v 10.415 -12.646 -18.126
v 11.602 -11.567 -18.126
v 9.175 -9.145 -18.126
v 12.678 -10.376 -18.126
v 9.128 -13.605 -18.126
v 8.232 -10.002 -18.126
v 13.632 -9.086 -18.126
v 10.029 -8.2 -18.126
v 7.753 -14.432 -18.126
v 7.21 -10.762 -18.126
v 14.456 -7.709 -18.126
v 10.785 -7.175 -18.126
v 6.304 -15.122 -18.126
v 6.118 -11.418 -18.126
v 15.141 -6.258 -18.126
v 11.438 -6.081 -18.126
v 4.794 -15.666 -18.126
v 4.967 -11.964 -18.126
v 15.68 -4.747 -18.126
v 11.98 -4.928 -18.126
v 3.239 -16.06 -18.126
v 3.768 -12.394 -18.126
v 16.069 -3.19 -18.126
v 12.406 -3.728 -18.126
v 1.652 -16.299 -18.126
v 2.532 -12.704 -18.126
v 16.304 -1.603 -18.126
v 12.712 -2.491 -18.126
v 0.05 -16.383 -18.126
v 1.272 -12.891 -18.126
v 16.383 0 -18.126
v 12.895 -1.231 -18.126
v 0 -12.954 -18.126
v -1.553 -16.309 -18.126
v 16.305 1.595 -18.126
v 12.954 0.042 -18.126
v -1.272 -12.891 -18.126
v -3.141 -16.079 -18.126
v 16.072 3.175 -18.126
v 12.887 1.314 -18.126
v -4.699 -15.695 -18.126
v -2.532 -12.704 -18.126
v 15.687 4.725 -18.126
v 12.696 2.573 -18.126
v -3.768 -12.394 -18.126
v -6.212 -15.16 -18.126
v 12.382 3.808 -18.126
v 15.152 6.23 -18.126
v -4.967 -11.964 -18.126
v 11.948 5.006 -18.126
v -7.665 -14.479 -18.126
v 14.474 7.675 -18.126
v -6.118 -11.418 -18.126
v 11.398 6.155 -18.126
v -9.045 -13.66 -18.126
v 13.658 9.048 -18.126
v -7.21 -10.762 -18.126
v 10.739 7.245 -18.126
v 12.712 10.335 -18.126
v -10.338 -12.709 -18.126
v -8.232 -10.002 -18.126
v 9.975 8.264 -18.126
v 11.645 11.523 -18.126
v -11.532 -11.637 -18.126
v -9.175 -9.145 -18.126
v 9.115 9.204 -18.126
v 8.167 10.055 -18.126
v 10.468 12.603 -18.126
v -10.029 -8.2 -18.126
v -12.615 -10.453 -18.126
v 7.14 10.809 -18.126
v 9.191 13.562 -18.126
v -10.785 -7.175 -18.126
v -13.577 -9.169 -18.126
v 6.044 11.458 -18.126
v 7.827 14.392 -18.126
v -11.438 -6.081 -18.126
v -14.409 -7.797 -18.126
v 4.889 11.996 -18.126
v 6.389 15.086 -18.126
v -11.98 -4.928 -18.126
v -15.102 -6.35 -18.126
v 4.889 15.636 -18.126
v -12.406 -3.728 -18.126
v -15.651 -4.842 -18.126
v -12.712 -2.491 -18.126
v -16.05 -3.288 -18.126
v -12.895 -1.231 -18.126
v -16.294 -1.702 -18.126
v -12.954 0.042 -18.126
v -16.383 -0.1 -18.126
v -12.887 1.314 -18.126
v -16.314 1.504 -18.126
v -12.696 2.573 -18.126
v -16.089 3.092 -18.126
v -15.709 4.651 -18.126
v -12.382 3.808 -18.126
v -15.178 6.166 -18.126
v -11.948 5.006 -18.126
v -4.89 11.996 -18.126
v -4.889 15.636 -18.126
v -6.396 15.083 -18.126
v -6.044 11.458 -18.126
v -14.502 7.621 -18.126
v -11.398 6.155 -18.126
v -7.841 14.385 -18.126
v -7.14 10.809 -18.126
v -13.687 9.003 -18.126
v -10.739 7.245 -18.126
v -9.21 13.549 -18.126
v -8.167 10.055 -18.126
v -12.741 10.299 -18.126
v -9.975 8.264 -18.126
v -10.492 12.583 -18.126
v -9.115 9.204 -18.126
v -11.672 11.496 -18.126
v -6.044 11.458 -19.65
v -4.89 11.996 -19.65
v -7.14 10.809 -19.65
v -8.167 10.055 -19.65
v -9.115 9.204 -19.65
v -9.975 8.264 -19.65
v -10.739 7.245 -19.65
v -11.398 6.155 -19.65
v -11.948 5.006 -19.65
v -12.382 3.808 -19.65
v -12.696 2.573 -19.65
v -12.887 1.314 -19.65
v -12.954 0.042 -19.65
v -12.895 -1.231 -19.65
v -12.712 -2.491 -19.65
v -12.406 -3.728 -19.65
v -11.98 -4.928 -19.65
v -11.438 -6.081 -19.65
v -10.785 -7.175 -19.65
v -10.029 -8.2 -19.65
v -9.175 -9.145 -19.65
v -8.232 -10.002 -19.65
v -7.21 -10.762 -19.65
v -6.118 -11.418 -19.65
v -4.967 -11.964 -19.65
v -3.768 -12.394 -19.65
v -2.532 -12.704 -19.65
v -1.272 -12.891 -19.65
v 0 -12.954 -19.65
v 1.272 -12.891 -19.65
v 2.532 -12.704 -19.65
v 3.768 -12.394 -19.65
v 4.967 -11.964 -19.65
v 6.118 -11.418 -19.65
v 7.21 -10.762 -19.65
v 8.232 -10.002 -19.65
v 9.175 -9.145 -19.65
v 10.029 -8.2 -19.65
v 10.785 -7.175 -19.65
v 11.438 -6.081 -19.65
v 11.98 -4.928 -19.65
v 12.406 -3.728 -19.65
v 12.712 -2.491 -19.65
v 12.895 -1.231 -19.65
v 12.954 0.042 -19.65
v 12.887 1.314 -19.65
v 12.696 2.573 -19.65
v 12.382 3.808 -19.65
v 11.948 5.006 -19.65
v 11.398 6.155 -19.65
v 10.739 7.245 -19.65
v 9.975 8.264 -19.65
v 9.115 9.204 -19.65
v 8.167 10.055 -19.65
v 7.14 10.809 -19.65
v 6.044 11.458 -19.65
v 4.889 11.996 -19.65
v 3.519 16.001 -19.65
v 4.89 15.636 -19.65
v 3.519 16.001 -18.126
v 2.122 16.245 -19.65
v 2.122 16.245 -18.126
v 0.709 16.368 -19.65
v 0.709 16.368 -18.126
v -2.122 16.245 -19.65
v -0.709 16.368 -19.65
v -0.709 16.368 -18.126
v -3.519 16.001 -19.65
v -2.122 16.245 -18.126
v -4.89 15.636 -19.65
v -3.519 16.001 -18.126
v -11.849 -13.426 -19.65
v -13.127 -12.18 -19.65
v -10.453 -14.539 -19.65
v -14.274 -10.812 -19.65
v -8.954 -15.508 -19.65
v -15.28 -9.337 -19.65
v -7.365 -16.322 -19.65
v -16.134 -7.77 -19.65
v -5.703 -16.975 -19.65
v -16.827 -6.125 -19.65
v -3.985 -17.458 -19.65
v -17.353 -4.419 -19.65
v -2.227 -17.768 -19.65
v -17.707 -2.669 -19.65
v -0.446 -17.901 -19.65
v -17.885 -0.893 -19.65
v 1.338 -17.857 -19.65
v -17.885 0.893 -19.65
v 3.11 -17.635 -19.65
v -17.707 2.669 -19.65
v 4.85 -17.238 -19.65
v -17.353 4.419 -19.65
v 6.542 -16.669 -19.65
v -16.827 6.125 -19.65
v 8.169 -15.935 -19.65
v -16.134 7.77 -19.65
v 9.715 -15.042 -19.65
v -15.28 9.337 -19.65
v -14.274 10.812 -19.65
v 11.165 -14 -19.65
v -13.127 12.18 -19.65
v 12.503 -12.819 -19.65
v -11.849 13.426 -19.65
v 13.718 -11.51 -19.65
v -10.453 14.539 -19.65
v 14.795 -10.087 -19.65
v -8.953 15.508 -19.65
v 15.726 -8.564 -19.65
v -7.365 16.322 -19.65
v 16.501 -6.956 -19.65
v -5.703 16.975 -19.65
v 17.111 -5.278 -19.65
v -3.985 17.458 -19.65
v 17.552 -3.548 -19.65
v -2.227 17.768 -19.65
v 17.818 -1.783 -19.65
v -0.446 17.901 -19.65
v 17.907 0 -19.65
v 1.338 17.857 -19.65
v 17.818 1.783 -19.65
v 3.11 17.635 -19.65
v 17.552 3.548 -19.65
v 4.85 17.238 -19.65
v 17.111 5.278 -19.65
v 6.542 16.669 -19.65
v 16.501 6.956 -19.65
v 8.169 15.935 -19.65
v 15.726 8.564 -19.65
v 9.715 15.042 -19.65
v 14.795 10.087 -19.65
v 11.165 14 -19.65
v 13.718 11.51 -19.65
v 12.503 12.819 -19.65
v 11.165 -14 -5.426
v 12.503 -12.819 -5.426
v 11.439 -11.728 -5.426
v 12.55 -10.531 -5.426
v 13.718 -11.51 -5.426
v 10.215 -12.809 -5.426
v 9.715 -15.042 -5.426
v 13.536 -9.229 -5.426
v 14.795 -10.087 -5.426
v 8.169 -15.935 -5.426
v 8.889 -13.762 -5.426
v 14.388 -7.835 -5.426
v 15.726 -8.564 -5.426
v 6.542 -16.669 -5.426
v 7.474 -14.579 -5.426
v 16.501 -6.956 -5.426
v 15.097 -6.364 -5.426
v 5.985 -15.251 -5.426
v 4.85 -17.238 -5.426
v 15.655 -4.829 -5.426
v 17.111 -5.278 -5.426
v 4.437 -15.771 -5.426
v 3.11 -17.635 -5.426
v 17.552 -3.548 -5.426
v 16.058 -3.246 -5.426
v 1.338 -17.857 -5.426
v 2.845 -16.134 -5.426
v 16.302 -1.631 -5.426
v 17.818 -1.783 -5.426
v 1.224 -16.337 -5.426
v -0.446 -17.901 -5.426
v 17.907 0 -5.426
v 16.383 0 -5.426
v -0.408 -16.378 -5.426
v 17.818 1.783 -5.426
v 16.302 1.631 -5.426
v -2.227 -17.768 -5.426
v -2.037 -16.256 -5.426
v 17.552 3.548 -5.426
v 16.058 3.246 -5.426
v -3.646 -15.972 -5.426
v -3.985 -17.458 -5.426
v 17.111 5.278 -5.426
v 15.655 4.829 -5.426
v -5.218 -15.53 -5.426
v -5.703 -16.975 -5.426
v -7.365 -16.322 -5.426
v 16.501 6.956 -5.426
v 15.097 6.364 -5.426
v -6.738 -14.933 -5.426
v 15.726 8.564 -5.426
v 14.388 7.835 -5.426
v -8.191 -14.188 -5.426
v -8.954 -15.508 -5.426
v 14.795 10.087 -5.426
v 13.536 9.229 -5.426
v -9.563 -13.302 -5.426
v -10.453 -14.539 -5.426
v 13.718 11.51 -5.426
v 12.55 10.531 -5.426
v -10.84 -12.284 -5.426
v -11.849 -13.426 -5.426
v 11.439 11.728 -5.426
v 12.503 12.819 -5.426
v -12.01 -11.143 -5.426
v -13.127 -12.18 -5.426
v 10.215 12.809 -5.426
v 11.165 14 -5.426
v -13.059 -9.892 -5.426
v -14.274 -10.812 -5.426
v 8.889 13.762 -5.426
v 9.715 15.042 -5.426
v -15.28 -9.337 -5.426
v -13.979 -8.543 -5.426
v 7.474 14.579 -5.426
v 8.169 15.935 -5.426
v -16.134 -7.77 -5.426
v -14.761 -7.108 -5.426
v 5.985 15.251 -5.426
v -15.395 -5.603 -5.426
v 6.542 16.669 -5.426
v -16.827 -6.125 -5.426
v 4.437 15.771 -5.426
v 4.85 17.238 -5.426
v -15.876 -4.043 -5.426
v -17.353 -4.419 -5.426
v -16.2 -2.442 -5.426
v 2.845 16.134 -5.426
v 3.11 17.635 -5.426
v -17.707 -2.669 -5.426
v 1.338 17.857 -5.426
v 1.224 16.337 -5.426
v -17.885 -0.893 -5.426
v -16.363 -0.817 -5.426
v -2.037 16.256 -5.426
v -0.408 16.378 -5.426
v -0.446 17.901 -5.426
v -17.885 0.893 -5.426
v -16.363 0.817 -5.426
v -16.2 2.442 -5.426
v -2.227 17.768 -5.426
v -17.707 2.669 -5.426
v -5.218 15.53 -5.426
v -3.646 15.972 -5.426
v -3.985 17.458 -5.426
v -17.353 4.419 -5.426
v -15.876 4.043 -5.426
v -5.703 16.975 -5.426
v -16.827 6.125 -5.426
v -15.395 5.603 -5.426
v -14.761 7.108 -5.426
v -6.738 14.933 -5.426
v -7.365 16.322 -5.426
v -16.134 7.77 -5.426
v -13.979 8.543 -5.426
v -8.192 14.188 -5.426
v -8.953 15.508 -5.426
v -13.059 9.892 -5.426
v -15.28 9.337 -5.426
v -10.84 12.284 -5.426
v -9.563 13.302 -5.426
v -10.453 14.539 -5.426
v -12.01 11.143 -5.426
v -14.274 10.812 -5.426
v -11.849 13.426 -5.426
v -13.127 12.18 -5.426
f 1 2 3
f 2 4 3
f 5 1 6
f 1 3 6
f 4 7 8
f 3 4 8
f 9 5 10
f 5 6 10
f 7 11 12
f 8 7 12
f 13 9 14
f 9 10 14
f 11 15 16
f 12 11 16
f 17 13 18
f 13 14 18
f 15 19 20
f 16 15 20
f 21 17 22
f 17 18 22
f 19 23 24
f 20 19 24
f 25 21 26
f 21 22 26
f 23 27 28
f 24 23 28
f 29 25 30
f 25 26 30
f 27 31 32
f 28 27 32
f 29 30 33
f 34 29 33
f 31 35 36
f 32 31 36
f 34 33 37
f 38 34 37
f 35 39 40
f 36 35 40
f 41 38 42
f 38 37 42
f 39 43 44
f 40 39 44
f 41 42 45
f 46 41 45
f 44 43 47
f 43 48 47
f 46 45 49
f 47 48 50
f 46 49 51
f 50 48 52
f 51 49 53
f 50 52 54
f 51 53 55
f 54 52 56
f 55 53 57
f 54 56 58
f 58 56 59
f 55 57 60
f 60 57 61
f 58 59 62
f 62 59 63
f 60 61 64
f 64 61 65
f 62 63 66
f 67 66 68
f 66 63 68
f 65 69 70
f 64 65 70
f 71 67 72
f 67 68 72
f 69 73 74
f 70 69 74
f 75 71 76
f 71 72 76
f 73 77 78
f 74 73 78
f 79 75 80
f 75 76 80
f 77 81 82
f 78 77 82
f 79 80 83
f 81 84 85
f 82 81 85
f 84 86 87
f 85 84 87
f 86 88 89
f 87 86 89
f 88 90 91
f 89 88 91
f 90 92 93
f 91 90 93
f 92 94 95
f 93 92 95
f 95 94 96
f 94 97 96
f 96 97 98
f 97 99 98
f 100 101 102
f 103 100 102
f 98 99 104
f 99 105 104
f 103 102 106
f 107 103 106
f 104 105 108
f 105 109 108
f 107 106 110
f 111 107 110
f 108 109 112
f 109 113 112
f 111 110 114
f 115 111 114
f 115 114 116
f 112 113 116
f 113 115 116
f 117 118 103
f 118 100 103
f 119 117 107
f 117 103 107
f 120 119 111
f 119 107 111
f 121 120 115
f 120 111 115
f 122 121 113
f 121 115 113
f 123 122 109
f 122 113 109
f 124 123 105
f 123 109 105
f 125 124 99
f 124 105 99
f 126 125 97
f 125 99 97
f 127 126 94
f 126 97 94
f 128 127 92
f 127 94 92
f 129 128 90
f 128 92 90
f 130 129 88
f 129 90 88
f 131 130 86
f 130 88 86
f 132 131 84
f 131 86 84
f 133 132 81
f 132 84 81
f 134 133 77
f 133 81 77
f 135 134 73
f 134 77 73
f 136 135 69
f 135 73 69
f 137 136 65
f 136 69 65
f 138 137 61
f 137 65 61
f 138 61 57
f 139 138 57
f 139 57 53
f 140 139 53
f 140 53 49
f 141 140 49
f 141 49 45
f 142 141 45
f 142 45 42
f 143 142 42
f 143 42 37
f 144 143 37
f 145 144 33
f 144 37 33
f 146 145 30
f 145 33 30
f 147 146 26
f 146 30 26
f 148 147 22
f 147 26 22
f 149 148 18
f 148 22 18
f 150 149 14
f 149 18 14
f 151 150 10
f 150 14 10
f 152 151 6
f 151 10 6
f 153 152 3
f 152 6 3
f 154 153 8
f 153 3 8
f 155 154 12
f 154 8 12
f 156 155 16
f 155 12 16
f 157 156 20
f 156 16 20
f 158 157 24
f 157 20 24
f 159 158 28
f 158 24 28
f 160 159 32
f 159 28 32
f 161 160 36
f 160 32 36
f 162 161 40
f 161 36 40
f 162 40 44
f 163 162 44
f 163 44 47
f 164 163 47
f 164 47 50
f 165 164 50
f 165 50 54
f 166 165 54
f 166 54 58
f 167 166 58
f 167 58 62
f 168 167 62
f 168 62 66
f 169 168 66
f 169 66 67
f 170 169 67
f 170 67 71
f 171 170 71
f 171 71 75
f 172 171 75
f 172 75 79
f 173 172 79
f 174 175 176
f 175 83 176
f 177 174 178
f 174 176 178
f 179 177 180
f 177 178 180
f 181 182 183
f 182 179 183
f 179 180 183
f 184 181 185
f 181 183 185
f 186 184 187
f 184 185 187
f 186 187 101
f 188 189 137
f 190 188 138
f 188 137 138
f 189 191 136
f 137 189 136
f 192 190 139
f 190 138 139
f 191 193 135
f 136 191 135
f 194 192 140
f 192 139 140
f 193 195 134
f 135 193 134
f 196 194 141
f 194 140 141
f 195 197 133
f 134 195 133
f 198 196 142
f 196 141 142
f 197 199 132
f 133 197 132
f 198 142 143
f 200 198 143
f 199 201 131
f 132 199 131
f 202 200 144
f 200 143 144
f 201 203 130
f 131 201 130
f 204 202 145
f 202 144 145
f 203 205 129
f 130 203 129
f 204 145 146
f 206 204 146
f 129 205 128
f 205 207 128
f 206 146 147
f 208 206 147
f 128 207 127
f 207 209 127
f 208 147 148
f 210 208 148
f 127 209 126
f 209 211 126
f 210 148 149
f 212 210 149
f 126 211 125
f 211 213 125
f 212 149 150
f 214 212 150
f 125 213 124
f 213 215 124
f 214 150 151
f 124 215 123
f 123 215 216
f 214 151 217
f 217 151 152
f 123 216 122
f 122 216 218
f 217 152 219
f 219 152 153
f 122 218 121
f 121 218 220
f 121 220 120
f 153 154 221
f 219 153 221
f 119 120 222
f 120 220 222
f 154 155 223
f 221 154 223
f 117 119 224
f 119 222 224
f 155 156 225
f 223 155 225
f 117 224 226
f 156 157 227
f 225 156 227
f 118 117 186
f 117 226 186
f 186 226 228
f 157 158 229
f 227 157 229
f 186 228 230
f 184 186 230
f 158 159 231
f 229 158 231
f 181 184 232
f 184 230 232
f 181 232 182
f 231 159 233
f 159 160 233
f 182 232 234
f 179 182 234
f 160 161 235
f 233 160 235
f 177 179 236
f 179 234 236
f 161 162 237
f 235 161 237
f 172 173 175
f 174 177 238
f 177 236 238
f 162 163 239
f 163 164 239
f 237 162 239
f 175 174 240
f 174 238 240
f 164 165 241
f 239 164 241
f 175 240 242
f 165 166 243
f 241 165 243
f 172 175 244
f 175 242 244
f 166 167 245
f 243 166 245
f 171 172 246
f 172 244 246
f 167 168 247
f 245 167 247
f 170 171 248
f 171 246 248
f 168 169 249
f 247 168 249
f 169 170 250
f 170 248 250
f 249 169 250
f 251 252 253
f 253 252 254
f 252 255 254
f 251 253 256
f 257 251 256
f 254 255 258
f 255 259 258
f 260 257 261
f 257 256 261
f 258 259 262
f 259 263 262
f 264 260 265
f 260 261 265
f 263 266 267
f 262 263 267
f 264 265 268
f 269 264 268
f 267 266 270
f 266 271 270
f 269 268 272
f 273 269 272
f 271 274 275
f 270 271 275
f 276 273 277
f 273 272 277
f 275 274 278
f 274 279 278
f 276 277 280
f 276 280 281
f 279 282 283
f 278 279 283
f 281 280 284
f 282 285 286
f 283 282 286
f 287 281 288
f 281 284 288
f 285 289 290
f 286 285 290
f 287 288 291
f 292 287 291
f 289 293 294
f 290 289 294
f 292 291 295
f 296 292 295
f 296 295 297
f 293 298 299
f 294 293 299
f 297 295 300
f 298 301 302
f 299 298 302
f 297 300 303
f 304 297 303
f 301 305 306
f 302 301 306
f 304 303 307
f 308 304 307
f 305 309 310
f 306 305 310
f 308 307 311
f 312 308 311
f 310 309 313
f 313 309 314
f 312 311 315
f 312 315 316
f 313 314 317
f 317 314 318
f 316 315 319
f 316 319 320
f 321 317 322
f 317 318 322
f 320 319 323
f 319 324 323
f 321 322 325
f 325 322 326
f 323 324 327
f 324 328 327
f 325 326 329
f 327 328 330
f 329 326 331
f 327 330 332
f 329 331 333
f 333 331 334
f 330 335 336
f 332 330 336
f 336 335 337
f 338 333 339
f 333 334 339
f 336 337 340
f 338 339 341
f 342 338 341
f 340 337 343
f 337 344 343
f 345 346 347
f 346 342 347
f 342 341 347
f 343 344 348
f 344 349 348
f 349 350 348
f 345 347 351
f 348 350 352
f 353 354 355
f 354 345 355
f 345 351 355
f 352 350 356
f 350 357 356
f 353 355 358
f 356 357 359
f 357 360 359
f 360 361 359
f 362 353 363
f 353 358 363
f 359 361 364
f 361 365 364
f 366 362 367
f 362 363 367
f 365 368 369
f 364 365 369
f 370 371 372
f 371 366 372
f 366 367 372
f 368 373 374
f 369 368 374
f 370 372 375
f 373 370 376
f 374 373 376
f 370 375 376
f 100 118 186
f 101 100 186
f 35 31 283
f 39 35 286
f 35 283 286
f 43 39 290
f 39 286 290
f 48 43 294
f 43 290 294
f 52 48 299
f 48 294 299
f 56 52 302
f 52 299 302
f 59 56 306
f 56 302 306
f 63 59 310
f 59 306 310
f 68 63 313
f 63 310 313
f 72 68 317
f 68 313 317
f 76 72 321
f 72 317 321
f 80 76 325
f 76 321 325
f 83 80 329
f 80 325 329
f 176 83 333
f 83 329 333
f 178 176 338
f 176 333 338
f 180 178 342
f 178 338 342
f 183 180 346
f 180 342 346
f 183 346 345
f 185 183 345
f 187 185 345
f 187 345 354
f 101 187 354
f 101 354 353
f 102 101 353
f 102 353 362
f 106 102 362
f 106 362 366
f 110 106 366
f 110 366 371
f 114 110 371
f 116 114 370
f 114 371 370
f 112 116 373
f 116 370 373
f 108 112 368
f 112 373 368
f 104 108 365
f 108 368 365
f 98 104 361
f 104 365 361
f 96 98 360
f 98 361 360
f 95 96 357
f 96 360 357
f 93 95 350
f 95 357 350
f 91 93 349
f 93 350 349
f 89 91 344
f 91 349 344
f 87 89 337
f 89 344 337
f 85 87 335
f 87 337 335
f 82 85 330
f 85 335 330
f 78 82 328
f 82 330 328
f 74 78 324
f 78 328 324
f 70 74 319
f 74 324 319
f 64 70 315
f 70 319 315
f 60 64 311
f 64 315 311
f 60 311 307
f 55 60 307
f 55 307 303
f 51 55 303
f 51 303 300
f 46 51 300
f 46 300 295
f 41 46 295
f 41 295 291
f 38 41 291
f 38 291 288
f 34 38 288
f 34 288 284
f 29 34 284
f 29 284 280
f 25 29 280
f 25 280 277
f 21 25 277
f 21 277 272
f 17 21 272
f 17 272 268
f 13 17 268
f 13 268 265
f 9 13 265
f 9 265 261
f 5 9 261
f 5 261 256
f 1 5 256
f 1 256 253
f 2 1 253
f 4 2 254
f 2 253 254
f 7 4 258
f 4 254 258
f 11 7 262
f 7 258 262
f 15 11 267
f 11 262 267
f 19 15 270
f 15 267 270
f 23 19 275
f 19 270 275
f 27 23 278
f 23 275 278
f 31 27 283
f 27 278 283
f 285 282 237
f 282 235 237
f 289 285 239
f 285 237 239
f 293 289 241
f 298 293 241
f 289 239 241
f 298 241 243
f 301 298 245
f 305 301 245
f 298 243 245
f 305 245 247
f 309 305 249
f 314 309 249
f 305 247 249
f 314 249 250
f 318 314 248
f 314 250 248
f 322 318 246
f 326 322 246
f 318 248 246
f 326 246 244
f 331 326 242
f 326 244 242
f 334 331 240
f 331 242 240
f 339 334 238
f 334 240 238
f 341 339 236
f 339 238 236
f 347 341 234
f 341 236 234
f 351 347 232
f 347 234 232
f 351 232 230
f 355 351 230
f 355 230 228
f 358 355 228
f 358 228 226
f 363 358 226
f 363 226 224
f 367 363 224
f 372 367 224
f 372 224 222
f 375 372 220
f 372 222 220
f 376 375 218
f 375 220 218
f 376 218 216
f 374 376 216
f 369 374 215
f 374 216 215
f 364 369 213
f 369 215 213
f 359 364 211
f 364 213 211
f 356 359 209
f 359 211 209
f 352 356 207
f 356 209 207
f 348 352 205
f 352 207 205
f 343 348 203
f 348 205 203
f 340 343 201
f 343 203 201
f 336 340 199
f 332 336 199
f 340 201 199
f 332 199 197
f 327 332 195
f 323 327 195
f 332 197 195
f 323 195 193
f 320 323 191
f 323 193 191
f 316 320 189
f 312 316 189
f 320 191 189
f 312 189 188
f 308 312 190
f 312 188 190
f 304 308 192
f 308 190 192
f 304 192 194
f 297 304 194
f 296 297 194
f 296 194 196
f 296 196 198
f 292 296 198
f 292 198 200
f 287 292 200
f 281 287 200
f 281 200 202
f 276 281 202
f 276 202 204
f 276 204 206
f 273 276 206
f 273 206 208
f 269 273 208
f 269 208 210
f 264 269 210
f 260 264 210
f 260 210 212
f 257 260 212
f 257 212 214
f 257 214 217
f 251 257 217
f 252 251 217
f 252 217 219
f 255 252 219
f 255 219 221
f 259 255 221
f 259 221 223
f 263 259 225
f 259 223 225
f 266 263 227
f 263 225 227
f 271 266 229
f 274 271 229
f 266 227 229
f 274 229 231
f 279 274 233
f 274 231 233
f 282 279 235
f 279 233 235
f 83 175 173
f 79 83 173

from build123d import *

# Parameters (mm, degrees)
CUT_EXTRUDE1_DEPTH = 15.224


with BuildPart() as part:
    # Sketch1 → Revolve1 (revolve)
    with BuildSketch(Plane(origin=(0, 0, 0), x_dir=(1, 0, 0), z_dir=(0, 1, 0))):
        Polygon((16.383, 5.425637802), (17.907, 5.425637802), (17.907, 19.649637802), (12.954, 19.649637802), (12.954, 18.125637802), (16.383, 18.125637802), align=None)
    revolve(axis=Axis((0, 0, -10.179008168), (0, 0, 1)))

    # Sketch2 → Cut-Extrude1 (cut, through all)
    with BuildSketch(Plane(origin=(0, 0, -19.649637802), x_dir=(-1, 0, 0), z_dir=(0, 0, -1))):
        with BuildLine():
            Line((-4.8895, 15.636351197), (-4.8895, 10.556351197))
            Line((-4.8895, 10.556351197), (4.8895, 10.556351197))
            Line((4.8895, 10.556351197), (4.8895, 15.636351197))
            ThreePointArc((4.8895, 15.636351197), (0, 16.383), (-4.8895, 15.636351197))
        make_face()
    extrude(amount=-CUT_EXTRUDE1_DEPTH, mode=Mode.SUBTRACT)


solid = part.part
